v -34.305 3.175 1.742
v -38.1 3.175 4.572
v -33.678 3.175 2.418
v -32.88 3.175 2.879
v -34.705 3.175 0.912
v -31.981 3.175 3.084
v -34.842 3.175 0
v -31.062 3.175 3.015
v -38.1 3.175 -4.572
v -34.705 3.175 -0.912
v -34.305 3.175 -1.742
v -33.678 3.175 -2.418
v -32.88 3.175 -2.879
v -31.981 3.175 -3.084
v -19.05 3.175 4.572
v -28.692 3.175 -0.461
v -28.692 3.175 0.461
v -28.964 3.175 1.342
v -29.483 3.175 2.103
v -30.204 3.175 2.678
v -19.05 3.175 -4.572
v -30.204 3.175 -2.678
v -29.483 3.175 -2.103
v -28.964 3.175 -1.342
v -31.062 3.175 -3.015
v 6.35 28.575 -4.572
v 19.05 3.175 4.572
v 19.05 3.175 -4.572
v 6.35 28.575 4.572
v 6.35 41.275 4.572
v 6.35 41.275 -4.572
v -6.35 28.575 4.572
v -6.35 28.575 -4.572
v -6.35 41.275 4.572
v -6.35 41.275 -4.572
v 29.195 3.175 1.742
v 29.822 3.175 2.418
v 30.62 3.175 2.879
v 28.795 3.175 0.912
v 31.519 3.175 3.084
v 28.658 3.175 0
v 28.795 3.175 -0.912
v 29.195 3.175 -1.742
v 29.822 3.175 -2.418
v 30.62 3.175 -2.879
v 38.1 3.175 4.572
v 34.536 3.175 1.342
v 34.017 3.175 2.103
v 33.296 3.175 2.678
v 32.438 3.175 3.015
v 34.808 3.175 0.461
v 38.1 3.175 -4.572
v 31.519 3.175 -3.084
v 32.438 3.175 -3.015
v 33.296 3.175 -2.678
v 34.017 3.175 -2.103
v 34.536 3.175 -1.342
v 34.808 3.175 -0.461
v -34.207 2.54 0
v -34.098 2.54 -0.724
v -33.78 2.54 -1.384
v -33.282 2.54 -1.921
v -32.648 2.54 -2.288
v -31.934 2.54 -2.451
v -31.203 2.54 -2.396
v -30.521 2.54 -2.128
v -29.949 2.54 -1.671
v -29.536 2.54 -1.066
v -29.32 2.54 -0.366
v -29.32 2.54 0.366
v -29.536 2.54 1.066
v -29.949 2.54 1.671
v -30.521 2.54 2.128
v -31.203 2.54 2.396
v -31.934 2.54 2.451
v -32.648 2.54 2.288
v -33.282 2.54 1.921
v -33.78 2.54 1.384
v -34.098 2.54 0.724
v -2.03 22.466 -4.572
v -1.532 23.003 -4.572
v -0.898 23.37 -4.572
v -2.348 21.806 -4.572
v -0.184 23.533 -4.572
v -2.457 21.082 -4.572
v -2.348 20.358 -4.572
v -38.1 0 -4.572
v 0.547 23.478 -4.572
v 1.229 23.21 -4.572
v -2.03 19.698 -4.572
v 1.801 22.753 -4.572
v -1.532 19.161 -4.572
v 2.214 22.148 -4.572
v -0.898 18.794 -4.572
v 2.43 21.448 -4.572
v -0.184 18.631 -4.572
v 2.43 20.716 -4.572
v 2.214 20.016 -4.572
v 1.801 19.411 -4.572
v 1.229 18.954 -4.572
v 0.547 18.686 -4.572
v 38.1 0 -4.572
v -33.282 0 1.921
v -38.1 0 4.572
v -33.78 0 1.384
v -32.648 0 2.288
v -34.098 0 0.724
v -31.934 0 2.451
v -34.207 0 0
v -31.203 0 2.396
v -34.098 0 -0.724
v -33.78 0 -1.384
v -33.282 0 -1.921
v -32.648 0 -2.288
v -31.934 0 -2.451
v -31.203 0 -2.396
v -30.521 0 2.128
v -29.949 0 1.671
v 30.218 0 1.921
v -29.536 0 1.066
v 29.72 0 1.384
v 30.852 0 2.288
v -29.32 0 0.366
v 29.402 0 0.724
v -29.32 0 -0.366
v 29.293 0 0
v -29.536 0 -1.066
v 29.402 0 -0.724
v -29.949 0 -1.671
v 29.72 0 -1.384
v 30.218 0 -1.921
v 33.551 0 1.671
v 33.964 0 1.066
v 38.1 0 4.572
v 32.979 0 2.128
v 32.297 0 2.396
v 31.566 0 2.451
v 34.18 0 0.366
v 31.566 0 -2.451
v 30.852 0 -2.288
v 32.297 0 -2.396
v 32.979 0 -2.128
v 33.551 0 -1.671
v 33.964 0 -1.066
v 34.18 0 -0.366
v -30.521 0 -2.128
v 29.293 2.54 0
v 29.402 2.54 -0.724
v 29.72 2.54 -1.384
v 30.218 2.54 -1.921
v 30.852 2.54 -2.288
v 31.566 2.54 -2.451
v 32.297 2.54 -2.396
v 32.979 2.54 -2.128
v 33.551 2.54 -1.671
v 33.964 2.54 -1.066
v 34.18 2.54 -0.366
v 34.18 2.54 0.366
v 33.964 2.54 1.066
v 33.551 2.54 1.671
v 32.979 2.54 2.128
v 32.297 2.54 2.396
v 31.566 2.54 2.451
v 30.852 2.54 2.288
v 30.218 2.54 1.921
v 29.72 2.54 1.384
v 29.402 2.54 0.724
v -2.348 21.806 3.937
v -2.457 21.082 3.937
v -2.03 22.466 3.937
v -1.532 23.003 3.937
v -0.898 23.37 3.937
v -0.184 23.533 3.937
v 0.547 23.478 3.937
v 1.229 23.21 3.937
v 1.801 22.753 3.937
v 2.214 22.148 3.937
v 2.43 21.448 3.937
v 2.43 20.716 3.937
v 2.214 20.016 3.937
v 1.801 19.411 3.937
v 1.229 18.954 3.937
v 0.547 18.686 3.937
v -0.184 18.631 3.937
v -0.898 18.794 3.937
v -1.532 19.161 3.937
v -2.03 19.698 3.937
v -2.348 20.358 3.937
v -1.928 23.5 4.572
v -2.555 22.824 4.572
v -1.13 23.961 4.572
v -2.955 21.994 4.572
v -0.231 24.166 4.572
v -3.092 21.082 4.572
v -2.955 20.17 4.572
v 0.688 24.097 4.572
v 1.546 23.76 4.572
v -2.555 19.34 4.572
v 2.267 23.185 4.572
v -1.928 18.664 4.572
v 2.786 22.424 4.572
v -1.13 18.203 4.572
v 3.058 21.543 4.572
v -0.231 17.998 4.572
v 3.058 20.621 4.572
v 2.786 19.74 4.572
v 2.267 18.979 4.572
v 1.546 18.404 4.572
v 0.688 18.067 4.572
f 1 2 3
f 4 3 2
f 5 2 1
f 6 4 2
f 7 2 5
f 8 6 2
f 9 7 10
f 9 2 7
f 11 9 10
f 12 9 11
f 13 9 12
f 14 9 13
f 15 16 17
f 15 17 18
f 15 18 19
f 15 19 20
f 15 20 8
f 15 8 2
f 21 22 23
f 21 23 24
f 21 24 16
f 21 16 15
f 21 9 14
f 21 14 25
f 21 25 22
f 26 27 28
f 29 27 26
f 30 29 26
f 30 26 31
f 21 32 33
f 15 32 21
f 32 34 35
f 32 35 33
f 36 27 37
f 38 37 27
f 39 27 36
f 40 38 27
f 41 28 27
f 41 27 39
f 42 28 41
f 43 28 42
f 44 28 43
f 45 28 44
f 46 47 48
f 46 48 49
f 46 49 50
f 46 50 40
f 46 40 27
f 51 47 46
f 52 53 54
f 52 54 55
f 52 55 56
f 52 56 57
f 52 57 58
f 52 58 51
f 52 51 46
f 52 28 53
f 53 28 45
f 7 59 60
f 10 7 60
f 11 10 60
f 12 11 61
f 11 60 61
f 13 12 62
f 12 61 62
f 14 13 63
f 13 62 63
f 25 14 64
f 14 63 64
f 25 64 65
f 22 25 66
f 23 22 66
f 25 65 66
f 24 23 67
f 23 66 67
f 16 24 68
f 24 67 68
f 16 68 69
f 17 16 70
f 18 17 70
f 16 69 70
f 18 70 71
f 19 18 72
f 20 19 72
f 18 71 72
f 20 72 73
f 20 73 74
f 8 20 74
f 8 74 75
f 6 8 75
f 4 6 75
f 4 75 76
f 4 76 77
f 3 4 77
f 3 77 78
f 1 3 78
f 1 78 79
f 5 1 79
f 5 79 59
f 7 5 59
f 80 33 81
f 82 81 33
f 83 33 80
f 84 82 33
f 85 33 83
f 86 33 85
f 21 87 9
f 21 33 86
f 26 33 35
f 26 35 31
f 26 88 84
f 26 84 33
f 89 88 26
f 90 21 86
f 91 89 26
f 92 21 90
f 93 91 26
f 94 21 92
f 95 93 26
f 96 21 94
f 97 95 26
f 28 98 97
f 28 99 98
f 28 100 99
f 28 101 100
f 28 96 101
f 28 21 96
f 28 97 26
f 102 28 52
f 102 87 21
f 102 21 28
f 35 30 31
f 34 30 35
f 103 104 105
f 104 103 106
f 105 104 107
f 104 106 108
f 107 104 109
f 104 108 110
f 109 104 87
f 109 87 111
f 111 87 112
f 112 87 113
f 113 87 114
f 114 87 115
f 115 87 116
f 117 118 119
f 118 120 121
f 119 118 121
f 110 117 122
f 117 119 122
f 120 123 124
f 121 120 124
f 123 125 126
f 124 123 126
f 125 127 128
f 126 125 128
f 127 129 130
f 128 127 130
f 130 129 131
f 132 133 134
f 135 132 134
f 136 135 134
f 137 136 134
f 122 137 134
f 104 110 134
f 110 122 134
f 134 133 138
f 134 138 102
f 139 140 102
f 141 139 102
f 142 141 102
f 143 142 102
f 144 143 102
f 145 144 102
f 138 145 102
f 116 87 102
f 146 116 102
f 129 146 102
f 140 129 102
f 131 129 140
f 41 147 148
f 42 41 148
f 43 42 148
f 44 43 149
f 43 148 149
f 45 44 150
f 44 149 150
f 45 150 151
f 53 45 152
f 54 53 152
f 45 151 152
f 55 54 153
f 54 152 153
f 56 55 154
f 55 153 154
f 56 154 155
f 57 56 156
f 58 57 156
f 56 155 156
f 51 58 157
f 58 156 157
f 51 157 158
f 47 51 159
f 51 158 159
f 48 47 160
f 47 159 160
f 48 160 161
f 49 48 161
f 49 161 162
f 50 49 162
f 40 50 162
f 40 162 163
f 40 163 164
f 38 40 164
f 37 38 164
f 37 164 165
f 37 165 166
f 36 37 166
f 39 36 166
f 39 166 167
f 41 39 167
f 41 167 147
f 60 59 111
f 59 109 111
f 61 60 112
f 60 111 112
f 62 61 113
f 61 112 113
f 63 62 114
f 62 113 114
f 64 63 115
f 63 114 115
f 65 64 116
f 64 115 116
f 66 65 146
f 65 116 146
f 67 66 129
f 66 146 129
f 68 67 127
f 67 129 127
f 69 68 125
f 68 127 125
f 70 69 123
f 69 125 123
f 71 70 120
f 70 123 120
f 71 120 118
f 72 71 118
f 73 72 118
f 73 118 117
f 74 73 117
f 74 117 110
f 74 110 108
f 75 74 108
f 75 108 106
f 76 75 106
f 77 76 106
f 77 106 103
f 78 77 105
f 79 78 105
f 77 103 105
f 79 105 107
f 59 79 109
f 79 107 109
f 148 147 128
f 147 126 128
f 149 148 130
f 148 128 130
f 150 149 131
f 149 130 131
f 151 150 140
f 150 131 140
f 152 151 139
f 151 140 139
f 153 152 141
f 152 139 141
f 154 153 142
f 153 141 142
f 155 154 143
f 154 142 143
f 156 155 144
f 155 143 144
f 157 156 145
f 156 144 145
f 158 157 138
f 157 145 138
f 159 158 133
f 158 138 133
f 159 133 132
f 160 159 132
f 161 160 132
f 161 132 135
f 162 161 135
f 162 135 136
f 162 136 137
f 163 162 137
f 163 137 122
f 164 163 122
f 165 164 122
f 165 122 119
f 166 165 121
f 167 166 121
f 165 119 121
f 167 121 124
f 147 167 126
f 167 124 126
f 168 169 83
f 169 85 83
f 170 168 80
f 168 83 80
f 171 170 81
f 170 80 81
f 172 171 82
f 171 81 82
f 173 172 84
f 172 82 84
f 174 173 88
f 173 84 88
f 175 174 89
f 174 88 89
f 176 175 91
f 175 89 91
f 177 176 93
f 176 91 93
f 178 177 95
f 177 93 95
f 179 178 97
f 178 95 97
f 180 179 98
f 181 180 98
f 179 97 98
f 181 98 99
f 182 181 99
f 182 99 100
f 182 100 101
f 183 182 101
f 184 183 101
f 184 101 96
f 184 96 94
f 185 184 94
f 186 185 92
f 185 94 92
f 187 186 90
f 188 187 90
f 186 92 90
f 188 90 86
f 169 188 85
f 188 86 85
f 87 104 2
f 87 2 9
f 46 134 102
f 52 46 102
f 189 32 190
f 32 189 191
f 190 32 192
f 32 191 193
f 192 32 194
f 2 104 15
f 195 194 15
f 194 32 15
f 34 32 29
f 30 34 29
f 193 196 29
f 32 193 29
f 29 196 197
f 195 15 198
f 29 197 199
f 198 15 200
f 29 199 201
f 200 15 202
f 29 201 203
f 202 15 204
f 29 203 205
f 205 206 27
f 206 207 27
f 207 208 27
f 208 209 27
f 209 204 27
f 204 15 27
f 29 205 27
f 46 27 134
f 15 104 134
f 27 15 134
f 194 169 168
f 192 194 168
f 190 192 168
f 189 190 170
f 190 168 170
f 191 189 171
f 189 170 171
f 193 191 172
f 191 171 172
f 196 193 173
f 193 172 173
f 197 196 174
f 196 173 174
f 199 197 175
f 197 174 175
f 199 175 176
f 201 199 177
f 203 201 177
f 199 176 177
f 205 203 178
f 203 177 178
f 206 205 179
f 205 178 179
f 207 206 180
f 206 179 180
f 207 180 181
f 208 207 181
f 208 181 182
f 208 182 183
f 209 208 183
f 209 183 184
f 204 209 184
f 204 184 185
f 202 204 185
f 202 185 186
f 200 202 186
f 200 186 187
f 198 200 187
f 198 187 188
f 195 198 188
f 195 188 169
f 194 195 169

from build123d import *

# Parameters (mm, degrees)
SKETCH1_W                       = 76.2
SKETCH1_H                       = 9.144
BOSS_EXTRUDE1_DEPTH             = 3.175
F_8_CLEARANCE_HOLE1_D           = 4.9149
F_8_CLEARANCE_HOLE1_CSINK_D     = 6.1849
F_8_CLEARANCE_HOLE1_CSINK_ANGLE = 90
BOSS_EXTRUDE2_DEPTH             = 9.144
F_8_CLEARANCE_HOLE2_D           = 4.9149
F_8_CLEARANCE_HOLE2_CSINK_D     = 6.1849
F_8_CLEARANCE_HOLE2_CSINK_ANGLE = 90


with BuildPart() as part:
    # Sketch1 → Boss-Extrude1 (new body)
    with BuildSketch(Plane(origin=(0, 0, 0), x_dir=(1, 0, 0), z_dir=(0, 1, 0))):
        Rectangle(SKETCH1_W, SKETCH1_H)
    extrude(amount=BOSS_EXTRUDE1_DEPTH)

    # #8 Clearance Hole1 (through all)
    with Locations(Plane(origin=(0, 3.175, 0), x_dir=(1, 0, 0), z_dir=(0, 1, 0))):
        with Locations((-31.75, 0), (31.75, 0)):
            CounterSinkHole(F_8_CLEARANCE_HOLE1_D / 2, F_8_CLEARANCE_HOLE1_CSINK_D / 2, counter_sink_angle=F_8_CLEARANCE_HOLE1_CSINK_ANGLE)

    # Sketch4 → Boss-Extrude2 (add)
    with BuildSketch(Plane.XY.offset(4.572)):
        Polygon((-6.35, 28.575), (-19.05, 3.175), (0, 3.175), (0, 41.275), (-6.35, 41.275), align=None)
        Polygon((0, 41.275), (0, 3.175), (19.05, 3.175), (6.35, 28.575), (6.35, 41.275), align=None)
    extrude(amount=-BOSS_EXTRUDE2_DEPTH)

    # #8 Clearance Hole2 (through all)
    with Locations(Plane.XY.offset(4.572)):
        with Locations((0, 21.082)):
            CounterSinkHole(F_8_CLEARANCE_HOLE2_D / 2, F_8_CLEARANCE_HOLE2_CSINK_D / 2, counter_sink_angle=F_8_CLEARANCE_HOLE2_CSINK_ANGLE)


solid = part.part
